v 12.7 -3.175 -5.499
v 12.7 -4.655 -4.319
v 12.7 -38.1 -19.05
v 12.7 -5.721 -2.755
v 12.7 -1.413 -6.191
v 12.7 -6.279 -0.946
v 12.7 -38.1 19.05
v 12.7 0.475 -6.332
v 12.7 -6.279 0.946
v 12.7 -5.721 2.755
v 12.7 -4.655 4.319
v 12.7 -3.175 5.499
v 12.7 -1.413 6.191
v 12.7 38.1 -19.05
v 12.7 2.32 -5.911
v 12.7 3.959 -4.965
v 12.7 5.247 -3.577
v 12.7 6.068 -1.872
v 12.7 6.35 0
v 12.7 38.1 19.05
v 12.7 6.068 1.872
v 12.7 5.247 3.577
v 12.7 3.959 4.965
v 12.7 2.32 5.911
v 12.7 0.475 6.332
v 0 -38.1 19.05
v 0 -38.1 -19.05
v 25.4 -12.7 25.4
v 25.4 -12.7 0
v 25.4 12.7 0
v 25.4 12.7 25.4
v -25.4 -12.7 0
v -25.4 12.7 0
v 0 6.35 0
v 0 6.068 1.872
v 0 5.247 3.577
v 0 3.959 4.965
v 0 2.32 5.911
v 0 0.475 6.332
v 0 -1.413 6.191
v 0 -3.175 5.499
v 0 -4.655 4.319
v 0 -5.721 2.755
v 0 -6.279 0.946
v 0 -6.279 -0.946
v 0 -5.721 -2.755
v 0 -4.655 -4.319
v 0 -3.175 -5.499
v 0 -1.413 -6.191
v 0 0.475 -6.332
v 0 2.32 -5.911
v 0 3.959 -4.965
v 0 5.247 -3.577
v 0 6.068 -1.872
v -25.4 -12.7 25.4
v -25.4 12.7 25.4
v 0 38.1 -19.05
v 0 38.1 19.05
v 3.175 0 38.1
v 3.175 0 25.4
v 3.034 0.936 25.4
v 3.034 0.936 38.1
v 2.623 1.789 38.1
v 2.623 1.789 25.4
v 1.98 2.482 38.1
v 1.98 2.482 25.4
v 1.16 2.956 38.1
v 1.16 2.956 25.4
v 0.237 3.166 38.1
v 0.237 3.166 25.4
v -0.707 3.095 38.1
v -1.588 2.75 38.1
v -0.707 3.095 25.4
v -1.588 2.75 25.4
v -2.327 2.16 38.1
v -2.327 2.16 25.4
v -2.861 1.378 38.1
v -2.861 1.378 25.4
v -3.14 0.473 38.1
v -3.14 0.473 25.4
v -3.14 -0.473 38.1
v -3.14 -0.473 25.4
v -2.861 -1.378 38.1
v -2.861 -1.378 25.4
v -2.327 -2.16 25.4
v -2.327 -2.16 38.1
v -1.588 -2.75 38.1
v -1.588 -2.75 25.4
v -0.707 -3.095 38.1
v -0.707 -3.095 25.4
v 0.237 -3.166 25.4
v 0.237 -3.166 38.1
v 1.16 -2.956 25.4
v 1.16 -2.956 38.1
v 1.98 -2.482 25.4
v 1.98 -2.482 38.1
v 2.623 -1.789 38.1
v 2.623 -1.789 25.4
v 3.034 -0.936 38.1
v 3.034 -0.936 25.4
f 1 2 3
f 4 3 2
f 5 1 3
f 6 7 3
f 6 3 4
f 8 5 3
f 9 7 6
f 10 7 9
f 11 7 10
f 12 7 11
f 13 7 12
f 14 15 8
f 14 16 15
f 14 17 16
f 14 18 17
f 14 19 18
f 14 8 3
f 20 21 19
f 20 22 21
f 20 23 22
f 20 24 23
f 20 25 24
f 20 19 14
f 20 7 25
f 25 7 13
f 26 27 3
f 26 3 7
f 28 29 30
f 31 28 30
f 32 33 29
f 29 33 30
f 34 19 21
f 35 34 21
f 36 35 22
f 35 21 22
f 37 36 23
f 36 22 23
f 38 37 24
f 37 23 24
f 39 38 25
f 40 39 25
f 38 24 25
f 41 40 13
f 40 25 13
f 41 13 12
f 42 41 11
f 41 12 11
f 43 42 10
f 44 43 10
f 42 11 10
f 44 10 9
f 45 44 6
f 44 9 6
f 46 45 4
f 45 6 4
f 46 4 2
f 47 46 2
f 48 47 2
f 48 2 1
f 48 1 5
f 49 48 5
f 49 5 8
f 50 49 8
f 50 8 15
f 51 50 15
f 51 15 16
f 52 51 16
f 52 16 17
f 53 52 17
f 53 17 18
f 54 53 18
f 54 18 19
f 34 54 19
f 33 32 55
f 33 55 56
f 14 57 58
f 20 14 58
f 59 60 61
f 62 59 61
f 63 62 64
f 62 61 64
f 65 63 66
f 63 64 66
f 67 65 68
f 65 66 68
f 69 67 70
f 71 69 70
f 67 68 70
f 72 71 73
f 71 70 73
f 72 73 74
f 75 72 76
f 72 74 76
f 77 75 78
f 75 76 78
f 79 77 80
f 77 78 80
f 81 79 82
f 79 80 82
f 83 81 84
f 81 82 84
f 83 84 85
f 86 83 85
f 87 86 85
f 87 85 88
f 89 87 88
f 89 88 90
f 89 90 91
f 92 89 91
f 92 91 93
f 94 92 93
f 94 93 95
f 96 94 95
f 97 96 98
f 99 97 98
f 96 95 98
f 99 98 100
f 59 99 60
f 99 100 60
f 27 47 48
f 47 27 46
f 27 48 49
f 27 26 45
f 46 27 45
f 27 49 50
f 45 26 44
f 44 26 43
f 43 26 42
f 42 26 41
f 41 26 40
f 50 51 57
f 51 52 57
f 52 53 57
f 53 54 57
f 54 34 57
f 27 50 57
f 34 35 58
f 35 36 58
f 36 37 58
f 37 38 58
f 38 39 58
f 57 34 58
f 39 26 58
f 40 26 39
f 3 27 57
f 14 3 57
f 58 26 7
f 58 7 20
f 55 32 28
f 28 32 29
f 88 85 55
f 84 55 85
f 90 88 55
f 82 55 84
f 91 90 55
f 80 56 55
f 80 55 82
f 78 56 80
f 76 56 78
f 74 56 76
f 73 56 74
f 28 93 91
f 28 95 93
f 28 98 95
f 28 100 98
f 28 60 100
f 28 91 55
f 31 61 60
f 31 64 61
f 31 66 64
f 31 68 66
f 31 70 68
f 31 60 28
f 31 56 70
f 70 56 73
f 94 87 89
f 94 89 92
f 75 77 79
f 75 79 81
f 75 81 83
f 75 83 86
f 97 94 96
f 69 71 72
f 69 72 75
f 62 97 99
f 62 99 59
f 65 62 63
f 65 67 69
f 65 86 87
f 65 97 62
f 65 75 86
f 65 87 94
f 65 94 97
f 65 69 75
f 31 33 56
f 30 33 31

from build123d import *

# Parameters (mm, degrees)
F0_W     = 50.8
F0_H     = 25.4
F1_DEPTH = 25.4
F2_R     = 3.175
F3_DEPTH = 12.7
F4_W     = 76.2
F4_H     = 38.1
F5_DEPTH = 12.7
F6_R     = 6.35
F7_DEPTH = 38.101


with BuildPart() as f1:
    # F0 (on Top) → F1 (new body)
    with BuildSketch(Plane.XY):
        Rectangle(F0_W, F0_H)
    extrude(amount=F1_DEPTH)

    # F2 (on face) → F3 (join)
    with BuildSketch(Plane.XY.offset(25.4)):
        Circle(F2_R)
    extrude(amount=F3_DEPTH)


with BuildPart() as f5:
    # F4 (on Right) → F5 (new body)
    with BuildSketch(Plane.YZ):
        Rectangle(F4_W, F4_H)
    extrude(amount=F5_DEPTH)

    # F6 (on face) → F7 (cut, through all)
    with BuildSketch(Plane.YZ.offset(12.7)):
        Circle(F6_R)
    extrude(amount=-F7_DEPTH, mode=Mode.SUBTRACT)


solid = Compound([f1.part, f5.part])
